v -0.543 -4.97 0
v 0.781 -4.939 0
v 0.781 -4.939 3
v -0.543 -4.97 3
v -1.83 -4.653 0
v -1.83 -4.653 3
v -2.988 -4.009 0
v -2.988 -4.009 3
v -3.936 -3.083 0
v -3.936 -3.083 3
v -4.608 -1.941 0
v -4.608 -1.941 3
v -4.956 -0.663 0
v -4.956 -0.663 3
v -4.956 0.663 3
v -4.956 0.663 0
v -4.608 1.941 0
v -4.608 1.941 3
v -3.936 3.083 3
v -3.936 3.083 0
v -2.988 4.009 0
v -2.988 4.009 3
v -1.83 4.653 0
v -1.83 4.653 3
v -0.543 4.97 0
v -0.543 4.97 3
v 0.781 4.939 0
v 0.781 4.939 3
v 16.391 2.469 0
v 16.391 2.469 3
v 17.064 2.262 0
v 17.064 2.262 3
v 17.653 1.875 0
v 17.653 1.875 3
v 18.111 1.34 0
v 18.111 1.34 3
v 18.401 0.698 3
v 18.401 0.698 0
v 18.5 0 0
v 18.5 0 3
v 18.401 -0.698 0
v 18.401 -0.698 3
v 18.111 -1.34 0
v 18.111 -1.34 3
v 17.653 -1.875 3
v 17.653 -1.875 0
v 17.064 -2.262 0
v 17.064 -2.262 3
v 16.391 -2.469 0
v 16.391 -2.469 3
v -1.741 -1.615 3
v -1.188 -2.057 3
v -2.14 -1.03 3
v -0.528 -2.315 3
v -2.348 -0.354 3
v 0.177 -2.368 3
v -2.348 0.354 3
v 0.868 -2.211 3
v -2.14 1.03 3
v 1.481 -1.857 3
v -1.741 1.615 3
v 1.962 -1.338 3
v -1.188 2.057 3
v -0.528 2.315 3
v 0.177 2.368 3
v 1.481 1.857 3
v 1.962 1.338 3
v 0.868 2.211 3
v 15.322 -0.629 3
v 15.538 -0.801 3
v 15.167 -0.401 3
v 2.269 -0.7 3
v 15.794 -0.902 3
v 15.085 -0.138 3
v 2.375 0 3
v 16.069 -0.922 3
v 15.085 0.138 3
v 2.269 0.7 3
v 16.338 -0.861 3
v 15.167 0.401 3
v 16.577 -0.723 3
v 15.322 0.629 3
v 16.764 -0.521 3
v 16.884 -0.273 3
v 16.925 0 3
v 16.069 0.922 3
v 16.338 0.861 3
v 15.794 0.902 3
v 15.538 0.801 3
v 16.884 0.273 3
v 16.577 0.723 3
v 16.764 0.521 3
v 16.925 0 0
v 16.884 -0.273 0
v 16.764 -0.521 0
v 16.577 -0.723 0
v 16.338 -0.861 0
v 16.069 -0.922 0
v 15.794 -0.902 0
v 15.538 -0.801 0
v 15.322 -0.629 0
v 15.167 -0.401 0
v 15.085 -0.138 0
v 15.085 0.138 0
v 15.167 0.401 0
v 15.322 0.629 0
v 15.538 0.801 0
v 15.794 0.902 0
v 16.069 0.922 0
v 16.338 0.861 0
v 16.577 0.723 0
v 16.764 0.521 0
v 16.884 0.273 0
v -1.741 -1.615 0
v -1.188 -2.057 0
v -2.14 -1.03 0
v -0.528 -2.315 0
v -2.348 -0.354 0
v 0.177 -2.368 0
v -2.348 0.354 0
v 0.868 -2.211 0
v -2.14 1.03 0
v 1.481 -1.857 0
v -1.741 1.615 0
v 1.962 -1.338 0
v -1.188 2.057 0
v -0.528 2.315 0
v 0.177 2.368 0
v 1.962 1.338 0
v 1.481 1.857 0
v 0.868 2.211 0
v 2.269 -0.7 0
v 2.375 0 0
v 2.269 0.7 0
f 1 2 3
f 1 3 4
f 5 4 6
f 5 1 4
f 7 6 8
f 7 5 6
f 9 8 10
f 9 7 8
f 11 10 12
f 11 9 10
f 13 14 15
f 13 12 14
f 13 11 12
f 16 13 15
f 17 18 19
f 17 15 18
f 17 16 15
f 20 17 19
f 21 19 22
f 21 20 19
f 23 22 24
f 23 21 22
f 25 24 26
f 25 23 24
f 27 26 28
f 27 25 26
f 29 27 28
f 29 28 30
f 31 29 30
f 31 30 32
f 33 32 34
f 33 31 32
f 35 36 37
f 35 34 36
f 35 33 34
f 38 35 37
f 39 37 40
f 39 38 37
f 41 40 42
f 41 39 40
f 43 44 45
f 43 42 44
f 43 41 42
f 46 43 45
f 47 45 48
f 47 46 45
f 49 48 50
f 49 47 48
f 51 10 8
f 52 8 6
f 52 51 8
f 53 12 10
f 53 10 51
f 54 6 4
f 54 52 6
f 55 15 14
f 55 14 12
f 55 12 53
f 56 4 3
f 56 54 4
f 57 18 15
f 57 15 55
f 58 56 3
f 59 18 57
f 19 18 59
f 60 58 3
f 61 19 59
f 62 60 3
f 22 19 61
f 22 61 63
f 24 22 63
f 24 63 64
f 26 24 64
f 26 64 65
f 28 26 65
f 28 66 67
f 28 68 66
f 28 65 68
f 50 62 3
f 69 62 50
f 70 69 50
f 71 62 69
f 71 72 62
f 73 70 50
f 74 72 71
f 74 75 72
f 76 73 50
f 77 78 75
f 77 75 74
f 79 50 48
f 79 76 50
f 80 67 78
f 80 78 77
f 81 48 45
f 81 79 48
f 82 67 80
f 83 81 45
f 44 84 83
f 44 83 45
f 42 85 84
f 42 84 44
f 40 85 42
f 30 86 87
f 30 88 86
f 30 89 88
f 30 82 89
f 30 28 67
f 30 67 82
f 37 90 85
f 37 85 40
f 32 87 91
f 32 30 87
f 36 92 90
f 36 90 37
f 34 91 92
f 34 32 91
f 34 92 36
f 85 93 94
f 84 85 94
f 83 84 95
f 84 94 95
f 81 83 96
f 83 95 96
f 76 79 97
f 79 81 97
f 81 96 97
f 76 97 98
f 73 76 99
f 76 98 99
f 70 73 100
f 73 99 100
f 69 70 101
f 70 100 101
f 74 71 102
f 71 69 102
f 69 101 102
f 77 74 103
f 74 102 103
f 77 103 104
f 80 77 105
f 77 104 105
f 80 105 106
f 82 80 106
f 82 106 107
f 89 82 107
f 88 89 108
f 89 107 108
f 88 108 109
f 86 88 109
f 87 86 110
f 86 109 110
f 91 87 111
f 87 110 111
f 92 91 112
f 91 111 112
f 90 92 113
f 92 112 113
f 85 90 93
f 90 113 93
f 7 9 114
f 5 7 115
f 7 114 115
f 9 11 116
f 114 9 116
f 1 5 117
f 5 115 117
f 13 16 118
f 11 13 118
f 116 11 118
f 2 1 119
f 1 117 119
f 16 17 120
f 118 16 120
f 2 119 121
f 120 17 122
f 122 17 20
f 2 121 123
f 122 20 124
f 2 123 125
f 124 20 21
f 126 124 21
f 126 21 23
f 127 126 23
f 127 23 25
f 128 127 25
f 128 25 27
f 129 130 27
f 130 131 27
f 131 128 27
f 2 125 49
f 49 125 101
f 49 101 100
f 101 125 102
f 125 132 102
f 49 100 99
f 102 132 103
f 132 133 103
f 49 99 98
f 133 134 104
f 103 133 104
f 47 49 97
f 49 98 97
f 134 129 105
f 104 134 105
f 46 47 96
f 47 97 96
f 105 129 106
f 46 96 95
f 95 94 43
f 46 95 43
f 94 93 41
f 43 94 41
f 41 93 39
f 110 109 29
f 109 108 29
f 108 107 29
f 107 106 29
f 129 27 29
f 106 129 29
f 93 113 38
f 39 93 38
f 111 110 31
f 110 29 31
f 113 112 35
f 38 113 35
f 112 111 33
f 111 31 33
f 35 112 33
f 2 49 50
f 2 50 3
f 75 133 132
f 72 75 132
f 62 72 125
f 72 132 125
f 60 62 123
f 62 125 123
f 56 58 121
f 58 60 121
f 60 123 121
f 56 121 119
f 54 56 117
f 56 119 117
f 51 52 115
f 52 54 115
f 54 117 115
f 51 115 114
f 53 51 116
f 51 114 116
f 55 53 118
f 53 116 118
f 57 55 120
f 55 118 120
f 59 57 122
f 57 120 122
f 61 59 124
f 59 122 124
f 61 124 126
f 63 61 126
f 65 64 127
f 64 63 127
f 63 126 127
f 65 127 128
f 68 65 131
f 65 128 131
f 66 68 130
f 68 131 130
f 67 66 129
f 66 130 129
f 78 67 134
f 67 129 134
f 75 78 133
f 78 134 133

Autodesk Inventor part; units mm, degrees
ref_plane "YZ Plane" through (0, 0, 0) normal (1, 0, 0) x (0, 1, 0)
ref_plane "XZ Plane" through (0, 0, 0) normal (0, 1, 0) x (-1, 0, 0)
ref_plane "XY Plane" through (0, 0, 0) normal (0, 0, 1) x (1, 0, 0)
sketch "Sketch1" plane through (0, 0, 0) normal (0, 0, 1) x (1, 0, 0)
  circle A0 centre (0, 0) radius 2.375
  line L0 (0.7812, 4.9386) -> (16.3906, 2.4693)
  arc A1 (16.3906, -2.4693) -> (16.3906, 2.4693) centre (16, 0) ccw
  line L1 (16.3906, -2.4693) -> (0.7812, -4.9386)
  arc A2 (0.7812, 4.9386) -> (0.7812, -4.9386) centre (0, 0) ccw
  circle A3 centre (16, 0) radius 0.925
  dimension "d0" = 4.75
  dimension "d3" = 2.5
  dimension "d6" = 5
  dimension "d7" = 16
  dimension "d8" = 1.85
extrude "Extrusion1" add sketch "Sketch1" along normal blind 3
properties part number "slider_link_p2"
